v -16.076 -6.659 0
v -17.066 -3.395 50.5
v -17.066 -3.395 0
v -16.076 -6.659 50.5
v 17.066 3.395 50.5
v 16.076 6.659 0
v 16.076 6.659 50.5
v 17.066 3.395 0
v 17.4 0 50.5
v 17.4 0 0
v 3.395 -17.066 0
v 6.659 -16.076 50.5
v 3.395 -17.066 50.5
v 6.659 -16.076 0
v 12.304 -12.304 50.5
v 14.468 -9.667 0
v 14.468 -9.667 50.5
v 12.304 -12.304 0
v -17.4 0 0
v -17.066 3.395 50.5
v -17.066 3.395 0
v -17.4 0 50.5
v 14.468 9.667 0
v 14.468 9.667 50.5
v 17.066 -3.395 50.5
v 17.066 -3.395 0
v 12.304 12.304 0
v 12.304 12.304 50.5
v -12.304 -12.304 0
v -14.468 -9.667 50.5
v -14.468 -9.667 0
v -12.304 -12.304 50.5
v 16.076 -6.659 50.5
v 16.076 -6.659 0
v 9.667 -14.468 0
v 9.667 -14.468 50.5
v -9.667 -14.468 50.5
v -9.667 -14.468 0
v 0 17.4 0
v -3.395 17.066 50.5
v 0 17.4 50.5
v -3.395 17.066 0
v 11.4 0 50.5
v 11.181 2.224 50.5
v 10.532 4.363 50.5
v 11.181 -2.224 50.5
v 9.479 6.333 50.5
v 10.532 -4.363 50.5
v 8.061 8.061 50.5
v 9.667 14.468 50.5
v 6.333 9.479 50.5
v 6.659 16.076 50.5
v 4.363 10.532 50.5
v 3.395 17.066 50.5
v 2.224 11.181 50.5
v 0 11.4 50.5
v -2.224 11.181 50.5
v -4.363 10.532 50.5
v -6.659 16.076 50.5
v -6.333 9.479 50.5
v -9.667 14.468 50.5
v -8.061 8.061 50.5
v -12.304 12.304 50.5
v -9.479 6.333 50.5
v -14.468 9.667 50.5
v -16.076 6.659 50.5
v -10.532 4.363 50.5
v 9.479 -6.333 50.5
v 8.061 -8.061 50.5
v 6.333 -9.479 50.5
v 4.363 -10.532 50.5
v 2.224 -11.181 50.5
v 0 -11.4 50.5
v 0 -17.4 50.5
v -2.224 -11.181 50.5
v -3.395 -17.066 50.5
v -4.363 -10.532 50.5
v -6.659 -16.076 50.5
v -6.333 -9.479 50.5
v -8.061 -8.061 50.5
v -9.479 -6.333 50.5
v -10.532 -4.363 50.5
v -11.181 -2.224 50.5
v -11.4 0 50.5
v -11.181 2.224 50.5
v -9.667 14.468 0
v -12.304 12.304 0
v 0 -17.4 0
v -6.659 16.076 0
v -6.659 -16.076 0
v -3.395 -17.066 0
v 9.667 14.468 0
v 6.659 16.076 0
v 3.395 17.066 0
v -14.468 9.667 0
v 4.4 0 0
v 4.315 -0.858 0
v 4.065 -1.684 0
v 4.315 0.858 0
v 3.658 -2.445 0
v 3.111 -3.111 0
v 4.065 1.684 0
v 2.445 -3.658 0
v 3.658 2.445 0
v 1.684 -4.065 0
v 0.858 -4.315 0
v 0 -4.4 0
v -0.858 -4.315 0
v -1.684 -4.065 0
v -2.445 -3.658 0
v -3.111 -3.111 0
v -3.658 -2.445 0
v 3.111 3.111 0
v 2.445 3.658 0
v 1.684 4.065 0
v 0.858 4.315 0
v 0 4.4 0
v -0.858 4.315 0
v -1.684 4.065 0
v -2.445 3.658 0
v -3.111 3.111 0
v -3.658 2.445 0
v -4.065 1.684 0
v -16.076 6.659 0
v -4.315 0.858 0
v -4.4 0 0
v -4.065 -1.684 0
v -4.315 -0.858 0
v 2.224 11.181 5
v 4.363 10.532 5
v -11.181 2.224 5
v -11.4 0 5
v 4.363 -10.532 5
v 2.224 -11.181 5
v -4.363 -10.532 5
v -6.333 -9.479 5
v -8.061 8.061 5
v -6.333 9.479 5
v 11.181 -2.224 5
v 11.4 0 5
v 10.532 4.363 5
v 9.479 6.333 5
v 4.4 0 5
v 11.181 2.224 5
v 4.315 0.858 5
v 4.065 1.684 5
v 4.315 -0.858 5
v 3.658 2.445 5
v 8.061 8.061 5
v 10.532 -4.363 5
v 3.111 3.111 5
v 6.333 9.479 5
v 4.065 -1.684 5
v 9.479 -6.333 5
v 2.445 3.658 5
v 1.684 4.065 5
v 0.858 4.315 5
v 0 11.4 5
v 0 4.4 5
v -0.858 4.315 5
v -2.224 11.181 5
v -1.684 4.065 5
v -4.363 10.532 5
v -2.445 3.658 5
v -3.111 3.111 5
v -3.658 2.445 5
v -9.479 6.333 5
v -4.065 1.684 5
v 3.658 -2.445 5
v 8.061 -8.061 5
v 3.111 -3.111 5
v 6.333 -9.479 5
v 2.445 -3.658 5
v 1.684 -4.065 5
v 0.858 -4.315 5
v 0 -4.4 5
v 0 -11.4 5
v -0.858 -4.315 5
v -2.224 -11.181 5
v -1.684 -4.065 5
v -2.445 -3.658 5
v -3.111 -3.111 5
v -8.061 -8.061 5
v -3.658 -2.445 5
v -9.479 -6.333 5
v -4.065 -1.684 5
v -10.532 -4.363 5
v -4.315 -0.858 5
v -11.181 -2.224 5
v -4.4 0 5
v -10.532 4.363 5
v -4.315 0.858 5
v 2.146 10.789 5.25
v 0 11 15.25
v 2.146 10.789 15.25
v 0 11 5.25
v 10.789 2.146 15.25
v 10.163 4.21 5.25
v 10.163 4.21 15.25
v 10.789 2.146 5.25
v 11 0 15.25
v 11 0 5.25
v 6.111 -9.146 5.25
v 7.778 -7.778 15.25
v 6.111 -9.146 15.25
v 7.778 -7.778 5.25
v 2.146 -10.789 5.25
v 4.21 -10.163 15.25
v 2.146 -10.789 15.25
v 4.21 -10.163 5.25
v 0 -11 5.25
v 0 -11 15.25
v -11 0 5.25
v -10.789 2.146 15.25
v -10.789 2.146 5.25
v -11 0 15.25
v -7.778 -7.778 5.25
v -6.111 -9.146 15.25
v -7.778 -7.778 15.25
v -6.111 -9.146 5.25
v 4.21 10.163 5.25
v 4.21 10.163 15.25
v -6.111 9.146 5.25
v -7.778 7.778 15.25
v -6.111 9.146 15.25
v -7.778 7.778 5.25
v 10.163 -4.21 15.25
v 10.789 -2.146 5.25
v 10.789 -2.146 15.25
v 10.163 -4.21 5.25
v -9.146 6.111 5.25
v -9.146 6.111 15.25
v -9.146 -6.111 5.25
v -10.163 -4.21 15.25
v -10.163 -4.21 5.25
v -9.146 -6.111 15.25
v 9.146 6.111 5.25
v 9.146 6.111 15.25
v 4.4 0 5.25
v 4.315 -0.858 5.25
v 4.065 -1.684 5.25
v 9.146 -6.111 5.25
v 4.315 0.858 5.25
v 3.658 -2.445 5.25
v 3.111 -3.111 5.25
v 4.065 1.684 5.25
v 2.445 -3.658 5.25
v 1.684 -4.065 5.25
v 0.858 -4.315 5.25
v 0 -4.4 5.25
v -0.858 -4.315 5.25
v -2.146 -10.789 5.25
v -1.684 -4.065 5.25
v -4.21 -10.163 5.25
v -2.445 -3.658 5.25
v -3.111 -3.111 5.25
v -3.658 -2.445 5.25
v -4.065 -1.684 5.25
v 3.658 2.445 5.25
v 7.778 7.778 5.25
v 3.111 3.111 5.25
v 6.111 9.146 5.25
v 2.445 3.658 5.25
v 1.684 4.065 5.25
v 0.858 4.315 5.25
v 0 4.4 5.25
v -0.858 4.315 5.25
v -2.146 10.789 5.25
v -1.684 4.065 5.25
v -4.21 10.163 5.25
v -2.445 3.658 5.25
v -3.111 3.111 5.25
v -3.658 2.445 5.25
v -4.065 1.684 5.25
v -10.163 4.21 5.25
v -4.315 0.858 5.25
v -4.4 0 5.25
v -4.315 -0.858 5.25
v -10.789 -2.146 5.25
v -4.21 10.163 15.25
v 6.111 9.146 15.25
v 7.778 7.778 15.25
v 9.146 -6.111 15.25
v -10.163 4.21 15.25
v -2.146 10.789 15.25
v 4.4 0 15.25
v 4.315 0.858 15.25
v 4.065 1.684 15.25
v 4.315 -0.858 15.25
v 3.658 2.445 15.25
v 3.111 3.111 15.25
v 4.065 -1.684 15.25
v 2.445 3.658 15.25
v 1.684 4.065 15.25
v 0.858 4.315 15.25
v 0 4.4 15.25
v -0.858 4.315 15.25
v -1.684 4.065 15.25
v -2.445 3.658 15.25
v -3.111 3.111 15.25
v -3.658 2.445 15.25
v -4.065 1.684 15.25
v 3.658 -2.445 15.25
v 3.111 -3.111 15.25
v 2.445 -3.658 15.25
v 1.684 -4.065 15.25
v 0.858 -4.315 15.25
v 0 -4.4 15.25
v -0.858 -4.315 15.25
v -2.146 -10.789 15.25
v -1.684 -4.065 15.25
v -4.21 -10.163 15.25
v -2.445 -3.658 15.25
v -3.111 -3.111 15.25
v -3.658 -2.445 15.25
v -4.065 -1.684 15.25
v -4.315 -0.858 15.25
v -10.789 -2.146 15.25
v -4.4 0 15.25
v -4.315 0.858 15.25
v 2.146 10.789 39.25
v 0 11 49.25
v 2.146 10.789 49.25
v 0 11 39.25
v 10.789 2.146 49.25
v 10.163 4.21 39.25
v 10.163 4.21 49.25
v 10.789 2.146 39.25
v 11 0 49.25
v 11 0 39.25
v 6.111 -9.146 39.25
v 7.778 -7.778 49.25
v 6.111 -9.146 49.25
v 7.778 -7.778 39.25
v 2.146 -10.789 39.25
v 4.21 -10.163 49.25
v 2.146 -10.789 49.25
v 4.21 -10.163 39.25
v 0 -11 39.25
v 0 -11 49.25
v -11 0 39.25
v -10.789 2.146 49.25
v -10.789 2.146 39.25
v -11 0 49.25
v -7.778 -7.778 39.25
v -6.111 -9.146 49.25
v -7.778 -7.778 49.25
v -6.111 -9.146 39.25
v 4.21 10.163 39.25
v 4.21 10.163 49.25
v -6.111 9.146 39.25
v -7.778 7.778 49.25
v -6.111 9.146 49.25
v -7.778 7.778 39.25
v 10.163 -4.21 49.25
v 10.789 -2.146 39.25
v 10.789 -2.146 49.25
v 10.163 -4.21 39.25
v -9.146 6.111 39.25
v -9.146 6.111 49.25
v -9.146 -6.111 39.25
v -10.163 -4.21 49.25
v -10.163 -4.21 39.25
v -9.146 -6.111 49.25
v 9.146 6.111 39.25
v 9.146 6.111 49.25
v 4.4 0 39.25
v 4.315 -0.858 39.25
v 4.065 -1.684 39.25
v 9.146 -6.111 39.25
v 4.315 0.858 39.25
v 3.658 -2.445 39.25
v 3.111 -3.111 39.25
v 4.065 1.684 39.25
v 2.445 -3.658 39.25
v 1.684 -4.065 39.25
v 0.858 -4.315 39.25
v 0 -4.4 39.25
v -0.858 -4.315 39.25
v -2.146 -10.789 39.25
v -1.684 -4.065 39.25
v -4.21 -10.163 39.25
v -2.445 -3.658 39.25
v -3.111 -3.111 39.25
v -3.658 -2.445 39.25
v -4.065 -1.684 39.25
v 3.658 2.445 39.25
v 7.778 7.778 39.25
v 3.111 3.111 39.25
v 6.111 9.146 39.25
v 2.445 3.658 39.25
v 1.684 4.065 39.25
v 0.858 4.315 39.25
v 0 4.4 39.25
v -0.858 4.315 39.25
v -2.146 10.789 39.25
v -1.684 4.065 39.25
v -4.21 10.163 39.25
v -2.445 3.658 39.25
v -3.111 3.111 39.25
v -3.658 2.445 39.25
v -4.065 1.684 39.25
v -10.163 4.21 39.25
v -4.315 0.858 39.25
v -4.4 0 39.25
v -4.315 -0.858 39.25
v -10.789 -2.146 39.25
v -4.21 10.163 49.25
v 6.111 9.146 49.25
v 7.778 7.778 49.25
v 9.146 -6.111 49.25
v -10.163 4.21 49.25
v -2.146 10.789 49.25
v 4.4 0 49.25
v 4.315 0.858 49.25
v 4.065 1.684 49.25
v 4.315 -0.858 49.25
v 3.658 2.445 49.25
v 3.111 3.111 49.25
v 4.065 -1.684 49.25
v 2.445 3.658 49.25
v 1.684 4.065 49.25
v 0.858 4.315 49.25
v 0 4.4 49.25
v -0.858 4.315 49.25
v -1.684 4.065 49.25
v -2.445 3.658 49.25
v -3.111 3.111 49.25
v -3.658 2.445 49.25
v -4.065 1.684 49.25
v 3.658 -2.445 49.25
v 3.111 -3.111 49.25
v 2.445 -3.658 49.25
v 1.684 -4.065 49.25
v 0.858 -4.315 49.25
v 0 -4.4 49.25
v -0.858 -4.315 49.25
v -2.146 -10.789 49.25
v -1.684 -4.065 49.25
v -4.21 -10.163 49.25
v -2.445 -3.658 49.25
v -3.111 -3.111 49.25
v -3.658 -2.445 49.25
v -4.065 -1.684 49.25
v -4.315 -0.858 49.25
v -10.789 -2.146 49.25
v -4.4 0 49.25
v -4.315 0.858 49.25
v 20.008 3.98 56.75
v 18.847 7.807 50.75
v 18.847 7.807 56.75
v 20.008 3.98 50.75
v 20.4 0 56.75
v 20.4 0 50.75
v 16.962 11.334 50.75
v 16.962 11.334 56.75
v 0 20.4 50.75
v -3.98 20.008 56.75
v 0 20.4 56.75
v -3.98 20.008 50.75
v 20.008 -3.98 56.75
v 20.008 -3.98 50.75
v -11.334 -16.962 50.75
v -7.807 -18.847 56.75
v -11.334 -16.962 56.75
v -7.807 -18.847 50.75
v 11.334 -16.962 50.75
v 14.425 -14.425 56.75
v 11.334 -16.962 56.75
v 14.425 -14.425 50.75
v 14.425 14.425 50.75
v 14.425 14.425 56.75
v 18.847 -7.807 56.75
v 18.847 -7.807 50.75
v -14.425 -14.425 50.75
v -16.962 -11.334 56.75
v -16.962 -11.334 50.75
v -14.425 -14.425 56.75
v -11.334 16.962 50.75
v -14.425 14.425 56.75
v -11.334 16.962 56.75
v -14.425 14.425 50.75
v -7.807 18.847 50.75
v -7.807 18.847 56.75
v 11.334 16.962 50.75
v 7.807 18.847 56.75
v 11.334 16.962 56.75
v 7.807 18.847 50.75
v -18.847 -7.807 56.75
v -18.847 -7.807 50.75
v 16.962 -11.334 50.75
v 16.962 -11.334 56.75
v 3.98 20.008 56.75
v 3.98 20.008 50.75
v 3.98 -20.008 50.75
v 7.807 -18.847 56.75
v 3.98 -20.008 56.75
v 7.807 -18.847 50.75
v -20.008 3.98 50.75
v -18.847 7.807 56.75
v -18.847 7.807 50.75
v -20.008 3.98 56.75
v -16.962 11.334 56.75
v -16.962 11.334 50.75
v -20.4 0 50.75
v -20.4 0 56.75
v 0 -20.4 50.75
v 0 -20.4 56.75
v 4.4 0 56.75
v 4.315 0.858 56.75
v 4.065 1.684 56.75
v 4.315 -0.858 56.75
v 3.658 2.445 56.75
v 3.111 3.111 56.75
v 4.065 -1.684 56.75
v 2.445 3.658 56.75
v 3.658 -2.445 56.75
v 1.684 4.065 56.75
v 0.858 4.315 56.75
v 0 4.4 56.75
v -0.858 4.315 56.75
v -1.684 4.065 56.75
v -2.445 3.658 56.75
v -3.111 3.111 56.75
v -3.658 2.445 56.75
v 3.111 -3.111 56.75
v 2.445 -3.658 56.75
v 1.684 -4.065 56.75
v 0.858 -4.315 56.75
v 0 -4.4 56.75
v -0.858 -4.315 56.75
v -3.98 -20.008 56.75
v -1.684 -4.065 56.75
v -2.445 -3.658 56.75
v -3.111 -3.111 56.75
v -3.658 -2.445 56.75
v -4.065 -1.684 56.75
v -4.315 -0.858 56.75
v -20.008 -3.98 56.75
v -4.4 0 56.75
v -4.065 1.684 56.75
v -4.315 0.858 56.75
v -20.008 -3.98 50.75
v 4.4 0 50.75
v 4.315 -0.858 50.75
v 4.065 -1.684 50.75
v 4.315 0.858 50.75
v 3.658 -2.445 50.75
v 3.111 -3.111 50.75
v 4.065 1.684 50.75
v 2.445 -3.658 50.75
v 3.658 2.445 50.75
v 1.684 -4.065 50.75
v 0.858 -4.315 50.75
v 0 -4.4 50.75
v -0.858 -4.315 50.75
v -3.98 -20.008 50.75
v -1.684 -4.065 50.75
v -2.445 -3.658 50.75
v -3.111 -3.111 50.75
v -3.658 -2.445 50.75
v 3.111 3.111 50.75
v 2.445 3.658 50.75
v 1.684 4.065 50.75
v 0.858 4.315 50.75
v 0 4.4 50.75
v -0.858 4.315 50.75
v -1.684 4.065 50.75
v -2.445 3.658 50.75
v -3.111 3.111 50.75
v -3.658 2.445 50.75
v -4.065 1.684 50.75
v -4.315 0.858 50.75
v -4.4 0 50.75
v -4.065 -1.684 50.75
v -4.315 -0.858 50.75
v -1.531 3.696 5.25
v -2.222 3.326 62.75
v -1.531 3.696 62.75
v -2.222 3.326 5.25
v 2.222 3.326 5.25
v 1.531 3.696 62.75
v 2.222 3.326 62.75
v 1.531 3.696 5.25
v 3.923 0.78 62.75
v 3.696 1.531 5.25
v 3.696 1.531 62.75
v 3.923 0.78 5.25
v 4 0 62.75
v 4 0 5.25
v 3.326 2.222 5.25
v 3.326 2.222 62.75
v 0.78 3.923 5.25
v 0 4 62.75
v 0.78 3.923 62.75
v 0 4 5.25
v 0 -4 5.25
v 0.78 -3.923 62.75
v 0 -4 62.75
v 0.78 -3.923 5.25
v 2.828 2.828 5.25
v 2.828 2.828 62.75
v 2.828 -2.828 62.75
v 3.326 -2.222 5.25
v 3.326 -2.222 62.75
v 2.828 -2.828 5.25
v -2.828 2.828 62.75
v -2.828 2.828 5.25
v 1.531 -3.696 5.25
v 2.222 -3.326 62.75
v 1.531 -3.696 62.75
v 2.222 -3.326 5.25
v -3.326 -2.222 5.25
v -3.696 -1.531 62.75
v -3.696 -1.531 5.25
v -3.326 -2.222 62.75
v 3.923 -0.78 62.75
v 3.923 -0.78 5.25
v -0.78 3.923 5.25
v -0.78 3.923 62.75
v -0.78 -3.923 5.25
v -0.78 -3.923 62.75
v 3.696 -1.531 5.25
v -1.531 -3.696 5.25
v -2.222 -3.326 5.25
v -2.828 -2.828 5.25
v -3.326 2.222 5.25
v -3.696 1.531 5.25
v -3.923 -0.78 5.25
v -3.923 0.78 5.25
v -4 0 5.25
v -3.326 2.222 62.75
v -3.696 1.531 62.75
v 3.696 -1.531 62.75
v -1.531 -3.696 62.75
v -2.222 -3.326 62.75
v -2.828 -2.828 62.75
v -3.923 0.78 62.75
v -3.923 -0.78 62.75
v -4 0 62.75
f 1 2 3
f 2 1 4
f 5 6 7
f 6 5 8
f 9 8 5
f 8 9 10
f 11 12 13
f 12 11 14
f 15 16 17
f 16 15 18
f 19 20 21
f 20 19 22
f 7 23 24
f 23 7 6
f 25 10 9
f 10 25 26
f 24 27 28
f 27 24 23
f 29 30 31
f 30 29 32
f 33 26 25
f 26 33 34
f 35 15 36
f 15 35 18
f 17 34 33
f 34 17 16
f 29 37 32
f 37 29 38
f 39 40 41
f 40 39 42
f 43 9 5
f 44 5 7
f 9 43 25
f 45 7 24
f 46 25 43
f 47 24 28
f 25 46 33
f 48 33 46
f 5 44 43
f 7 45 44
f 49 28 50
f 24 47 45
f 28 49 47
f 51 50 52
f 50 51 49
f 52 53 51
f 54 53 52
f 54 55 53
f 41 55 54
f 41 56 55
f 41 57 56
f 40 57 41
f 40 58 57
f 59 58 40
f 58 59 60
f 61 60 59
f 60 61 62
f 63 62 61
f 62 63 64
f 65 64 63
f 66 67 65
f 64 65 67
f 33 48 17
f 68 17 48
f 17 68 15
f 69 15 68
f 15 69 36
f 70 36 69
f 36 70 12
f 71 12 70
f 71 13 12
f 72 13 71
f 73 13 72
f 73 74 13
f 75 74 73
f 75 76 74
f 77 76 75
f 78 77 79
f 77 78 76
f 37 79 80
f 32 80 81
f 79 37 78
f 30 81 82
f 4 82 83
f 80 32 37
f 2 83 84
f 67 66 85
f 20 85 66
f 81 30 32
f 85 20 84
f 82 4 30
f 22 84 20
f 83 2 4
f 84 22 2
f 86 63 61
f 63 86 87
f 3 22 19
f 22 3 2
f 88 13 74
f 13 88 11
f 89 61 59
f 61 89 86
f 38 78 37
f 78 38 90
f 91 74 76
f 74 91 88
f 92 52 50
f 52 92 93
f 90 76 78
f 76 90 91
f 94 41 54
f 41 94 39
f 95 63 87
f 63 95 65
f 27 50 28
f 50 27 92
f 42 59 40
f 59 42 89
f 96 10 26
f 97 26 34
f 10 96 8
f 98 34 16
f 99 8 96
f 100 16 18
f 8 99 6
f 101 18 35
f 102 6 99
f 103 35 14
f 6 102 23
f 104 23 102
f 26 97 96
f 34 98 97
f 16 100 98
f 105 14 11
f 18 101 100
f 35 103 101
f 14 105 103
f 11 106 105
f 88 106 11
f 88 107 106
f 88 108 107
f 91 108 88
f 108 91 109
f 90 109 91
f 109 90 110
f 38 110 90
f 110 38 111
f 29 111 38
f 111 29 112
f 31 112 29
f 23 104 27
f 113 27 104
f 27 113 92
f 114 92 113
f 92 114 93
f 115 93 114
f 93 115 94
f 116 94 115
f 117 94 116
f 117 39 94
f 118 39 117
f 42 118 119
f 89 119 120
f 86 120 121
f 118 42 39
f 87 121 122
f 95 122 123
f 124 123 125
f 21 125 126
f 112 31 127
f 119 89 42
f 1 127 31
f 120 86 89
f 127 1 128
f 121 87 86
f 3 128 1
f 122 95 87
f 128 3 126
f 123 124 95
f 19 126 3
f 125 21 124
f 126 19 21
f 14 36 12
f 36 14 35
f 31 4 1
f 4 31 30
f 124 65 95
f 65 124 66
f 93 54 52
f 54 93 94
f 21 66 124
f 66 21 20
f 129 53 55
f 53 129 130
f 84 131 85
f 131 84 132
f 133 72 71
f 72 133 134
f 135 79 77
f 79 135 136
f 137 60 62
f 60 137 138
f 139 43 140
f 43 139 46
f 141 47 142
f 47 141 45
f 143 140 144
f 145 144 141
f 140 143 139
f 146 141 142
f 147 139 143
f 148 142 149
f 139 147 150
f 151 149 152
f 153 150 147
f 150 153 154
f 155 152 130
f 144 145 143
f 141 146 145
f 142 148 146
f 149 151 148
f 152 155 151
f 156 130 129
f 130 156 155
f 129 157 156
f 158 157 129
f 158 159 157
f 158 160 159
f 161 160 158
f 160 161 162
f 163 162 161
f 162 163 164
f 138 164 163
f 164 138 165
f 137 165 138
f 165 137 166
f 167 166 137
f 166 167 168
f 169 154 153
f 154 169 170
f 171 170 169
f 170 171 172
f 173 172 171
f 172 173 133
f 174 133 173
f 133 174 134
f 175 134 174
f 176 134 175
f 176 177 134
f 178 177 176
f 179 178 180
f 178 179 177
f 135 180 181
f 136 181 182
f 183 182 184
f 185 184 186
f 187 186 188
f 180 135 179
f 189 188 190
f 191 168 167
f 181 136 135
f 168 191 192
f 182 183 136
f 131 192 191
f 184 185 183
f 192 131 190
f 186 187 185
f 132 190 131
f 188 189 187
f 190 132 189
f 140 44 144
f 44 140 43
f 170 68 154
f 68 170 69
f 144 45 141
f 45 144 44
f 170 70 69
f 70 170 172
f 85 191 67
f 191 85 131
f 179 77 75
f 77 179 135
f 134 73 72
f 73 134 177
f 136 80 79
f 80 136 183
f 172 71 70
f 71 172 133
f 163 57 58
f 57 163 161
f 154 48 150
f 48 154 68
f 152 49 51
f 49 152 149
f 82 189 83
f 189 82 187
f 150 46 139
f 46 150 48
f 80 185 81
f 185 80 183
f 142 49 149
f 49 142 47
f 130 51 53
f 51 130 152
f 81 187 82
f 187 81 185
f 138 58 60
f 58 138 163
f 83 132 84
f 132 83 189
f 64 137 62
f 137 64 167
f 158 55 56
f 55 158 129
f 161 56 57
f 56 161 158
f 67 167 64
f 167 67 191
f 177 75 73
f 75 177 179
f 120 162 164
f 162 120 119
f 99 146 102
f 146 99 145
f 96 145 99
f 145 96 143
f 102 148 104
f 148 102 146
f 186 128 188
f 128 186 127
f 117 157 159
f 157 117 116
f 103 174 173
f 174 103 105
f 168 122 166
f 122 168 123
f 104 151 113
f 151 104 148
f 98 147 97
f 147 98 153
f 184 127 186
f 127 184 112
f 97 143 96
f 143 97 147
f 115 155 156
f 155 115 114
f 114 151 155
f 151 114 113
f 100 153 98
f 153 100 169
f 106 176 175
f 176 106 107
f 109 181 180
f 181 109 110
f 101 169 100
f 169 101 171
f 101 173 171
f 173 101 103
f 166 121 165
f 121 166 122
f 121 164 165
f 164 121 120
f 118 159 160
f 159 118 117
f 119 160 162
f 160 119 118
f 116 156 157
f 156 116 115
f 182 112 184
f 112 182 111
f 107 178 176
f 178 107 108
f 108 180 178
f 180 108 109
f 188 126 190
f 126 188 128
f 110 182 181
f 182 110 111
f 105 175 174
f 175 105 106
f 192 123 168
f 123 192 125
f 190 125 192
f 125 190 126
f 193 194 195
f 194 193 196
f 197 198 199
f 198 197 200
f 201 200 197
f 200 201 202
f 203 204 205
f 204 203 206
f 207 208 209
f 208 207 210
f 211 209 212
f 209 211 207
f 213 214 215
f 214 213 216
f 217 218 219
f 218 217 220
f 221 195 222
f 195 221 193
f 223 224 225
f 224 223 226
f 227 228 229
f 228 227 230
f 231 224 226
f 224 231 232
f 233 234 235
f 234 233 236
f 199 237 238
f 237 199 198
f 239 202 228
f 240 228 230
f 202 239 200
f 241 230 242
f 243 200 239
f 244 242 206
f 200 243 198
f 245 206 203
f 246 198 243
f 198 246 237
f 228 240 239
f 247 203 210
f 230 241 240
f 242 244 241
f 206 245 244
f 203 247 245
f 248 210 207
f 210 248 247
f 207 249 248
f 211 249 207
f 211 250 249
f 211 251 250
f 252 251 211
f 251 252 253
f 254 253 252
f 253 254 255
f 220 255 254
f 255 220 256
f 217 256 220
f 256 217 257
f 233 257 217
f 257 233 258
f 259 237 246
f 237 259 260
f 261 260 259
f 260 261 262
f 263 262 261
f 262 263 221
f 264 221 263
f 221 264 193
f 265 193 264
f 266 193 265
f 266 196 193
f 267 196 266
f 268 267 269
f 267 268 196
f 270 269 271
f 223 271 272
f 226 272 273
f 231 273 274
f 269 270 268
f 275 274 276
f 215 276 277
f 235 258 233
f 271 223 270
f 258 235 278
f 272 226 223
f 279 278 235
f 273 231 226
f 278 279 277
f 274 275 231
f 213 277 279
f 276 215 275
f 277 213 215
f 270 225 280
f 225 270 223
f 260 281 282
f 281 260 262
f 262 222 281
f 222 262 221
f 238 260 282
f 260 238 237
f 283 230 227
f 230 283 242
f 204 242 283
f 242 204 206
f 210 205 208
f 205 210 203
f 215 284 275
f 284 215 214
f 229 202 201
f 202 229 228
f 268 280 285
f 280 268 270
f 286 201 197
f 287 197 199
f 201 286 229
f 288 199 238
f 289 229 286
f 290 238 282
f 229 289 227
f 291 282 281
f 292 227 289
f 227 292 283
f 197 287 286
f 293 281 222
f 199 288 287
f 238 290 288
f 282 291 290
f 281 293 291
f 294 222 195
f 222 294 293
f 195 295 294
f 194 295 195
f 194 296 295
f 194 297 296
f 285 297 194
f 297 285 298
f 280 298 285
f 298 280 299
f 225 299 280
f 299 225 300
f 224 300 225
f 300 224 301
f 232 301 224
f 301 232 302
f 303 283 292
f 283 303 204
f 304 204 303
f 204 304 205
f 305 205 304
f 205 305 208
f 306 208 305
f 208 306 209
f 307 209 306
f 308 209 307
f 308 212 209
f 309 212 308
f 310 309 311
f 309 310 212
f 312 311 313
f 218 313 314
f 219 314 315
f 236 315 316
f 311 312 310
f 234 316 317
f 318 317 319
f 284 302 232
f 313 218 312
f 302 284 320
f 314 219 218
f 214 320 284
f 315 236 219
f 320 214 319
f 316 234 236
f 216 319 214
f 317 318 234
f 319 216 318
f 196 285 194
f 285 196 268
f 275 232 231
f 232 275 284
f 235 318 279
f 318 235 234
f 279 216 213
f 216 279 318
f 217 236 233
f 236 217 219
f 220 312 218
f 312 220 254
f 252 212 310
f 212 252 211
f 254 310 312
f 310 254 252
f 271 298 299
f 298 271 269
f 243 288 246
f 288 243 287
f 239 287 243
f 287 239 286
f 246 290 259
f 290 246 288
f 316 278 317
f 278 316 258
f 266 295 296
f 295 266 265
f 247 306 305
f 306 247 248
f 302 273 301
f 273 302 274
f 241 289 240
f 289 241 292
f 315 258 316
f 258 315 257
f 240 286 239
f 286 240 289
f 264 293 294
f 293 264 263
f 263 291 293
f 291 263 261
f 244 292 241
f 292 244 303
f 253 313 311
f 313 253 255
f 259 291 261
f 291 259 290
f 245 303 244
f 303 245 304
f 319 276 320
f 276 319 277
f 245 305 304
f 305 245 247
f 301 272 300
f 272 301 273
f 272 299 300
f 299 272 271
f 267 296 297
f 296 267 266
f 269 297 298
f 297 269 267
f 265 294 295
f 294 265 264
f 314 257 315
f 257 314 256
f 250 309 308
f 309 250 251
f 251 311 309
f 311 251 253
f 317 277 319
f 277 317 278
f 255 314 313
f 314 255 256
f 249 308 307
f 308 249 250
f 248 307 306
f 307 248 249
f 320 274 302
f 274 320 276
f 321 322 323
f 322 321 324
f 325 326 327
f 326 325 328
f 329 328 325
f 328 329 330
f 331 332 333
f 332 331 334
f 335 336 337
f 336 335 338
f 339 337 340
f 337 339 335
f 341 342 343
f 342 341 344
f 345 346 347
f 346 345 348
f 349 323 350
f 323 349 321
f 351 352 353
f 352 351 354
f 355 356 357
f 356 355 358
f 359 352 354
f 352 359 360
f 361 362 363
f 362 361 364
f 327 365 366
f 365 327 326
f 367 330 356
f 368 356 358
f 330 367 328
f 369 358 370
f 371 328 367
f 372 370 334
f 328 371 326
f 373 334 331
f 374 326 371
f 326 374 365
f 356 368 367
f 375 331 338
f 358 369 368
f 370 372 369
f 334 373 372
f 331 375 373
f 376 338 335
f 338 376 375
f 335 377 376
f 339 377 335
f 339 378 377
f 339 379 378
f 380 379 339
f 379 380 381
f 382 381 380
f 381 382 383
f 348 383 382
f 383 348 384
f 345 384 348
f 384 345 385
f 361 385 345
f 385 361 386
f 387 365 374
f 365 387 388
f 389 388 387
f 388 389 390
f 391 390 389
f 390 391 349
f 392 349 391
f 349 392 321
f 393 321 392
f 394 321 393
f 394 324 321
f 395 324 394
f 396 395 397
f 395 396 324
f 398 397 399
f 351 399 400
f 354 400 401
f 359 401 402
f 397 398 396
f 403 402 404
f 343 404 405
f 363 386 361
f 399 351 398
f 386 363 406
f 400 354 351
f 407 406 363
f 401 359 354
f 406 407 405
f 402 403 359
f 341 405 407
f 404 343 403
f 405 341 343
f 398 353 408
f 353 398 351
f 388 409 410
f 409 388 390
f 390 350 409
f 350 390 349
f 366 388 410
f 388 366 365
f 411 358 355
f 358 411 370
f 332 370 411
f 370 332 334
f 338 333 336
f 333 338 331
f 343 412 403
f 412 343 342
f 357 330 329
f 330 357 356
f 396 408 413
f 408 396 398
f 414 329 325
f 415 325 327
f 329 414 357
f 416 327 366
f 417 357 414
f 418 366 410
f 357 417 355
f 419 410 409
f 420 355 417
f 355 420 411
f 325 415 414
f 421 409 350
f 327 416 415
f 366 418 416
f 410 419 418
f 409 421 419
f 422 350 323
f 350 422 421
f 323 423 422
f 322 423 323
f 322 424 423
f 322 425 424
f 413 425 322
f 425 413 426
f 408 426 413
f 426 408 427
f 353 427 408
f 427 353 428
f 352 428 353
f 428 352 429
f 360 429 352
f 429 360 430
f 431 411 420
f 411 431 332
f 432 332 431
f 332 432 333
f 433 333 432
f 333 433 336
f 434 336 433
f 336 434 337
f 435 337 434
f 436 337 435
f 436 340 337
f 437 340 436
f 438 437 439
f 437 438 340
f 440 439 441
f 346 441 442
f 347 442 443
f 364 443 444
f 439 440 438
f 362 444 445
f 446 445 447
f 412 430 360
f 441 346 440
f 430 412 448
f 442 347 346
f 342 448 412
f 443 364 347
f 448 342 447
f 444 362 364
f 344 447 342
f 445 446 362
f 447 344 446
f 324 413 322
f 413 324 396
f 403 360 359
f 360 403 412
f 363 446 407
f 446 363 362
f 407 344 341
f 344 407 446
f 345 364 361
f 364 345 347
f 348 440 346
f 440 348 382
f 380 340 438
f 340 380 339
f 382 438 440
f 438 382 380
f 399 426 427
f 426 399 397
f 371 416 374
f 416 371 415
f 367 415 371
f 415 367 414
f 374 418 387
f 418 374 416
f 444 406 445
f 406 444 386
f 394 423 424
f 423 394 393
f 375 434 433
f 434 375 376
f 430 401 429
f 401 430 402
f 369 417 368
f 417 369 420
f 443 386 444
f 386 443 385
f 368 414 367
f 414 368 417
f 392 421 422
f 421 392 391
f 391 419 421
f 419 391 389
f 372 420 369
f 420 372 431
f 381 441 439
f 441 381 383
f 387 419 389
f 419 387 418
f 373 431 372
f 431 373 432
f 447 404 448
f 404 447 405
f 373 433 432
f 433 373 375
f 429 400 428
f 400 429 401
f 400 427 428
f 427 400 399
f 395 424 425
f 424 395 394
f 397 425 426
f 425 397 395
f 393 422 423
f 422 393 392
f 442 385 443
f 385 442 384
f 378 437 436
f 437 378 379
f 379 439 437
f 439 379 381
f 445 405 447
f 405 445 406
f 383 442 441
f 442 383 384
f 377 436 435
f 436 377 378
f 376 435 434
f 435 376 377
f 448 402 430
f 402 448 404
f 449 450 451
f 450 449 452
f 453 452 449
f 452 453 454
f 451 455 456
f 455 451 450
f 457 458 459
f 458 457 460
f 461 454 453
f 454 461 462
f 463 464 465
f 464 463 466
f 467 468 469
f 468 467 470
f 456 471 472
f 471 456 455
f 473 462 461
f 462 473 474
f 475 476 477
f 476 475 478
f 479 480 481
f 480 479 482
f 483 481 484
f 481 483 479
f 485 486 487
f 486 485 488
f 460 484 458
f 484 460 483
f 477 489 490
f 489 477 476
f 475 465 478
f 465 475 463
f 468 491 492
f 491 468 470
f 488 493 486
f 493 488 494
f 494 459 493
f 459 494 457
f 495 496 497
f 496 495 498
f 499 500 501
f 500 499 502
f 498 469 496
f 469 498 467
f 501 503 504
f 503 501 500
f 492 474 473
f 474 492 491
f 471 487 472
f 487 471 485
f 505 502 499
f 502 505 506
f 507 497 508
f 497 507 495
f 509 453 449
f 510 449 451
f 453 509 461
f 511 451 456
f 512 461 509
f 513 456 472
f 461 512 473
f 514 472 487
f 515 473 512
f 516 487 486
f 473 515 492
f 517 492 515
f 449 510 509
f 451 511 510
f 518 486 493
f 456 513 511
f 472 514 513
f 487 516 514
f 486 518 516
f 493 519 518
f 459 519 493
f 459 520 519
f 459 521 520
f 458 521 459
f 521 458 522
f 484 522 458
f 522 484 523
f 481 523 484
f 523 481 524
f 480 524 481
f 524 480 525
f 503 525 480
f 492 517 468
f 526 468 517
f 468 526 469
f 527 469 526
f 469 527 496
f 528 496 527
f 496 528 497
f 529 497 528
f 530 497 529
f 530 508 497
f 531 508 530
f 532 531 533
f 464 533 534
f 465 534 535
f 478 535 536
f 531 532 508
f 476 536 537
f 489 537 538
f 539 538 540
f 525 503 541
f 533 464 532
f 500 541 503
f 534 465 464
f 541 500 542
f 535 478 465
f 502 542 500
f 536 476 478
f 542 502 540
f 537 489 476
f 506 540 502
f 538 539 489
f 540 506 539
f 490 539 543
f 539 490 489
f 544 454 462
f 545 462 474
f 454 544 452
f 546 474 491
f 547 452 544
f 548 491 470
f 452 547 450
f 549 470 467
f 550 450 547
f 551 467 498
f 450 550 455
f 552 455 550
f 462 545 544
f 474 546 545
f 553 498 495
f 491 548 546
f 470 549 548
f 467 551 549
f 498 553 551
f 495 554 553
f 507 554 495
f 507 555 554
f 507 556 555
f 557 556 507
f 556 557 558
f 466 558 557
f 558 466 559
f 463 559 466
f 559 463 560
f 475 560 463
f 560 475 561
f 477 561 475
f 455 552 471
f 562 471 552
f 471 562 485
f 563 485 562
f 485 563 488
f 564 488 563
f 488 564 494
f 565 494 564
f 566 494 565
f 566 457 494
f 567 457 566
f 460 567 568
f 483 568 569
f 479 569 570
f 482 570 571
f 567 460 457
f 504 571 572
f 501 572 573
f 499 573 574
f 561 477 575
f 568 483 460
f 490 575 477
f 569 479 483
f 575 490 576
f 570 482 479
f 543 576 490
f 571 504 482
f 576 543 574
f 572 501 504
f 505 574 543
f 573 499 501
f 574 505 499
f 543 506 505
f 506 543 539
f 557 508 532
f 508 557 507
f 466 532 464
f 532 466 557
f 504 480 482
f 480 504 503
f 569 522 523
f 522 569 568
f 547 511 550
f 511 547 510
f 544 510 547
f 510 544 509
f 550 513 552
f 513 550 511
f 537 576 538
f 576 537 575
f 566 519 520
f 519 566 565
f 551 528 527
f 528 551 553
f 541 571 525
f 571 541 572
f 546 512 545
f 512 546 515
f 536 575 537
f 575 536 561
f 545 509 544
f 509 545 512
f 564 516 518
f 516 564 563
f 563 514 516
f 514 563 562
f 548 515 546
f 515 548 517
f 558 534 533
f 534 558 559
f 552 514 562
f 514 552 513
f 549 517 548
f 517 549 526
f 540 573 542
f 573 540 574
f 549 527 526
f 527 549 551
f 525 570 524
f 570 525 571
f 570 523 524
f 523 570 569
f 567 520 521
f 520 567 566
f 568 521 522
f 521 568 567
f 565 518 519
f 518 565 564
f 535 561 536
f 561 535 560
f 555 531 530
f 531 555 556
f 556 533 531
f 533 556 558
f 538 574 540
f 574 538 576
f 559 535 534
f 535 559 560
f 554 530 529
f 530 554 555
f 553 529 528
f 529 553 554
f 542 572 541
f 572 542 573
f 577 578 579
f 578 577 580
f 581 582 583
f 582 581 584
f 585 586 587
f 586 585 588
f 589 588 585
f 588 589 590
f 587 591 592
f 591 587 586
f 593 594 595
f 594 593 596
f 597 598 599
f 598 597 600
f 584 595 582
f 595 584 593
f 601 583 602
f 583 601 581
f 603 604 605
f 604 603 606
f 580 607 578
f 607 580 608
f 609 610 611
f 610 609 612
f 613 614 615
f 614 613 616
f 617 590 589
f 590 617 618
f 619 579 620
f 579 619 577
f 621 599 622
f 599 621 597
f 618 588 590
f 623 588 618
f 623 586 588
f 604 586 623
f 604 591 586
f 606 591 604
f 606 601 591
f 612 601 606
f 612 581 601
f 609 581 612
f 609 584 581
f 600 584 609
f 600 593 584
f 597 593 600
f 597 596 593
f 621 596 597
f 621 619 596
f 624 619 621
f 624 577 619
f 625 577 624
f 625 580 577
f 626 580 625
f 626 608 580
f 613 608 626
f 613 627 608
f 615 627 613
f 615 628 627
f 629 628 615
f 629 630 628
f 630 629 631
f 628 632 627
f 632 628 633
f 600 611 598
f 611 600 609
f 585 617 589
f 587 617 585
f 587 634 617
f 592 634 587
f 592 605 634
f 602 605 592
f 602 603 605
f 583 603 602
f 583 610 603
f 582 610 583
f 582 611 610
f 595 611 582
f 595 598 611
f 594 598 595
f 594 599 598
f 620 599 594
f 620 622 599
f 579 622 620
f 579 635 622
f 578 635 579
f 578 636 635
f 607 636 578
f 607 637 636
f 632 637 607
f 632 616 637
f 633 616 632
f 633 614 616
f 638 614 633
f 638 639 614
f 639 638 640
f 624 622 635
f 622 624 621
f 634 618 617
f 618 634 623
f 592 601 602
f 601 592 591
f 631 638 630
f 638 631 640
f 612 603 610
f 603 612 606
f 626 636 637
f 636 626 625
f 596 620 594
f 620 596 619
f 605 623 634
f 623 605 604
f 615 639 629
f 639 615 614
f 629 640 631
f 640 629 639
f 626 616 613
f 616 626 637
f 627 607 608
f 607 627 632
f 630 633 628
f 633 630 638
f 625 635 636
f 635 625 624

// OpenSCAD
$fn = 32;

// ------------------------------------------------------------------------
// Shaft station: cup d34.8 x 50.5 mm, shaft d8
// Every part is its own module, assembly() places every instance.
// ------------------------------------------------------------------------

// --- part 1 ---
module housing_cup() {
  difference() {
    cylinder(h = 50.5, d = 34.8);
    translate([0, 0, 5]) cylinder(h = 46.5, d = 22.8);
    translate([0, 0, -1]) cylinder(h = 7, d = 8.8);
  }
}

// --- part 2 ---
module bearing_lower() {
  difference() {
      translate([0, 0, 0]) cylinder(h = 10, d = 22);
      translate([0, 0, -1]) cylinder(h = 12, d = 8.8);
    }
}

// --- part 3 ---
module bearing_upper() {
  difference() {
      translate([0, 0, 0]) cylinder(h = 10, d = 22);
      translate([0, 0, -1]) cylinder(h = 12, d = 8.8);
    }
}

// --- part 4 ---
module station_shaft() {
  translate([0, 0, -28.75]) cylinder(h = 57.5, d = 8);
}

// --- part 5 ---
module station_cover() {
  difference() {
    cylinder(h = 6, d = 40.8);
    translate([0, 0, -1]) cylinder(h = 8, d = 8.8);
  }
}

// --- assembly ---
module assembly() {
  color([0.80, 0.24, 0.20]) translate([0, 0, 0]) rotate([0, 0, 0]) housing_cup();
  color([0.20, 0.45, 0.75]) translate([0, 0, 5.25]) rotate([0, 0, 0]) bearing_lower();
  color([0.25, 0.62, 0.32]) translate([0, 0, 39.25]) rotate([0, 0, 0]) bearing_upper();
  color([0.92, 0.70, 0.18]) translate([0, 0, 34]) rotate([0, 0, 0]) station_shaft();
  color([0.58, 0.35, 0.70]) translate([0, 0, 50.75]) rotate([0, 0, 0]) station_cover();
}

assembly();
